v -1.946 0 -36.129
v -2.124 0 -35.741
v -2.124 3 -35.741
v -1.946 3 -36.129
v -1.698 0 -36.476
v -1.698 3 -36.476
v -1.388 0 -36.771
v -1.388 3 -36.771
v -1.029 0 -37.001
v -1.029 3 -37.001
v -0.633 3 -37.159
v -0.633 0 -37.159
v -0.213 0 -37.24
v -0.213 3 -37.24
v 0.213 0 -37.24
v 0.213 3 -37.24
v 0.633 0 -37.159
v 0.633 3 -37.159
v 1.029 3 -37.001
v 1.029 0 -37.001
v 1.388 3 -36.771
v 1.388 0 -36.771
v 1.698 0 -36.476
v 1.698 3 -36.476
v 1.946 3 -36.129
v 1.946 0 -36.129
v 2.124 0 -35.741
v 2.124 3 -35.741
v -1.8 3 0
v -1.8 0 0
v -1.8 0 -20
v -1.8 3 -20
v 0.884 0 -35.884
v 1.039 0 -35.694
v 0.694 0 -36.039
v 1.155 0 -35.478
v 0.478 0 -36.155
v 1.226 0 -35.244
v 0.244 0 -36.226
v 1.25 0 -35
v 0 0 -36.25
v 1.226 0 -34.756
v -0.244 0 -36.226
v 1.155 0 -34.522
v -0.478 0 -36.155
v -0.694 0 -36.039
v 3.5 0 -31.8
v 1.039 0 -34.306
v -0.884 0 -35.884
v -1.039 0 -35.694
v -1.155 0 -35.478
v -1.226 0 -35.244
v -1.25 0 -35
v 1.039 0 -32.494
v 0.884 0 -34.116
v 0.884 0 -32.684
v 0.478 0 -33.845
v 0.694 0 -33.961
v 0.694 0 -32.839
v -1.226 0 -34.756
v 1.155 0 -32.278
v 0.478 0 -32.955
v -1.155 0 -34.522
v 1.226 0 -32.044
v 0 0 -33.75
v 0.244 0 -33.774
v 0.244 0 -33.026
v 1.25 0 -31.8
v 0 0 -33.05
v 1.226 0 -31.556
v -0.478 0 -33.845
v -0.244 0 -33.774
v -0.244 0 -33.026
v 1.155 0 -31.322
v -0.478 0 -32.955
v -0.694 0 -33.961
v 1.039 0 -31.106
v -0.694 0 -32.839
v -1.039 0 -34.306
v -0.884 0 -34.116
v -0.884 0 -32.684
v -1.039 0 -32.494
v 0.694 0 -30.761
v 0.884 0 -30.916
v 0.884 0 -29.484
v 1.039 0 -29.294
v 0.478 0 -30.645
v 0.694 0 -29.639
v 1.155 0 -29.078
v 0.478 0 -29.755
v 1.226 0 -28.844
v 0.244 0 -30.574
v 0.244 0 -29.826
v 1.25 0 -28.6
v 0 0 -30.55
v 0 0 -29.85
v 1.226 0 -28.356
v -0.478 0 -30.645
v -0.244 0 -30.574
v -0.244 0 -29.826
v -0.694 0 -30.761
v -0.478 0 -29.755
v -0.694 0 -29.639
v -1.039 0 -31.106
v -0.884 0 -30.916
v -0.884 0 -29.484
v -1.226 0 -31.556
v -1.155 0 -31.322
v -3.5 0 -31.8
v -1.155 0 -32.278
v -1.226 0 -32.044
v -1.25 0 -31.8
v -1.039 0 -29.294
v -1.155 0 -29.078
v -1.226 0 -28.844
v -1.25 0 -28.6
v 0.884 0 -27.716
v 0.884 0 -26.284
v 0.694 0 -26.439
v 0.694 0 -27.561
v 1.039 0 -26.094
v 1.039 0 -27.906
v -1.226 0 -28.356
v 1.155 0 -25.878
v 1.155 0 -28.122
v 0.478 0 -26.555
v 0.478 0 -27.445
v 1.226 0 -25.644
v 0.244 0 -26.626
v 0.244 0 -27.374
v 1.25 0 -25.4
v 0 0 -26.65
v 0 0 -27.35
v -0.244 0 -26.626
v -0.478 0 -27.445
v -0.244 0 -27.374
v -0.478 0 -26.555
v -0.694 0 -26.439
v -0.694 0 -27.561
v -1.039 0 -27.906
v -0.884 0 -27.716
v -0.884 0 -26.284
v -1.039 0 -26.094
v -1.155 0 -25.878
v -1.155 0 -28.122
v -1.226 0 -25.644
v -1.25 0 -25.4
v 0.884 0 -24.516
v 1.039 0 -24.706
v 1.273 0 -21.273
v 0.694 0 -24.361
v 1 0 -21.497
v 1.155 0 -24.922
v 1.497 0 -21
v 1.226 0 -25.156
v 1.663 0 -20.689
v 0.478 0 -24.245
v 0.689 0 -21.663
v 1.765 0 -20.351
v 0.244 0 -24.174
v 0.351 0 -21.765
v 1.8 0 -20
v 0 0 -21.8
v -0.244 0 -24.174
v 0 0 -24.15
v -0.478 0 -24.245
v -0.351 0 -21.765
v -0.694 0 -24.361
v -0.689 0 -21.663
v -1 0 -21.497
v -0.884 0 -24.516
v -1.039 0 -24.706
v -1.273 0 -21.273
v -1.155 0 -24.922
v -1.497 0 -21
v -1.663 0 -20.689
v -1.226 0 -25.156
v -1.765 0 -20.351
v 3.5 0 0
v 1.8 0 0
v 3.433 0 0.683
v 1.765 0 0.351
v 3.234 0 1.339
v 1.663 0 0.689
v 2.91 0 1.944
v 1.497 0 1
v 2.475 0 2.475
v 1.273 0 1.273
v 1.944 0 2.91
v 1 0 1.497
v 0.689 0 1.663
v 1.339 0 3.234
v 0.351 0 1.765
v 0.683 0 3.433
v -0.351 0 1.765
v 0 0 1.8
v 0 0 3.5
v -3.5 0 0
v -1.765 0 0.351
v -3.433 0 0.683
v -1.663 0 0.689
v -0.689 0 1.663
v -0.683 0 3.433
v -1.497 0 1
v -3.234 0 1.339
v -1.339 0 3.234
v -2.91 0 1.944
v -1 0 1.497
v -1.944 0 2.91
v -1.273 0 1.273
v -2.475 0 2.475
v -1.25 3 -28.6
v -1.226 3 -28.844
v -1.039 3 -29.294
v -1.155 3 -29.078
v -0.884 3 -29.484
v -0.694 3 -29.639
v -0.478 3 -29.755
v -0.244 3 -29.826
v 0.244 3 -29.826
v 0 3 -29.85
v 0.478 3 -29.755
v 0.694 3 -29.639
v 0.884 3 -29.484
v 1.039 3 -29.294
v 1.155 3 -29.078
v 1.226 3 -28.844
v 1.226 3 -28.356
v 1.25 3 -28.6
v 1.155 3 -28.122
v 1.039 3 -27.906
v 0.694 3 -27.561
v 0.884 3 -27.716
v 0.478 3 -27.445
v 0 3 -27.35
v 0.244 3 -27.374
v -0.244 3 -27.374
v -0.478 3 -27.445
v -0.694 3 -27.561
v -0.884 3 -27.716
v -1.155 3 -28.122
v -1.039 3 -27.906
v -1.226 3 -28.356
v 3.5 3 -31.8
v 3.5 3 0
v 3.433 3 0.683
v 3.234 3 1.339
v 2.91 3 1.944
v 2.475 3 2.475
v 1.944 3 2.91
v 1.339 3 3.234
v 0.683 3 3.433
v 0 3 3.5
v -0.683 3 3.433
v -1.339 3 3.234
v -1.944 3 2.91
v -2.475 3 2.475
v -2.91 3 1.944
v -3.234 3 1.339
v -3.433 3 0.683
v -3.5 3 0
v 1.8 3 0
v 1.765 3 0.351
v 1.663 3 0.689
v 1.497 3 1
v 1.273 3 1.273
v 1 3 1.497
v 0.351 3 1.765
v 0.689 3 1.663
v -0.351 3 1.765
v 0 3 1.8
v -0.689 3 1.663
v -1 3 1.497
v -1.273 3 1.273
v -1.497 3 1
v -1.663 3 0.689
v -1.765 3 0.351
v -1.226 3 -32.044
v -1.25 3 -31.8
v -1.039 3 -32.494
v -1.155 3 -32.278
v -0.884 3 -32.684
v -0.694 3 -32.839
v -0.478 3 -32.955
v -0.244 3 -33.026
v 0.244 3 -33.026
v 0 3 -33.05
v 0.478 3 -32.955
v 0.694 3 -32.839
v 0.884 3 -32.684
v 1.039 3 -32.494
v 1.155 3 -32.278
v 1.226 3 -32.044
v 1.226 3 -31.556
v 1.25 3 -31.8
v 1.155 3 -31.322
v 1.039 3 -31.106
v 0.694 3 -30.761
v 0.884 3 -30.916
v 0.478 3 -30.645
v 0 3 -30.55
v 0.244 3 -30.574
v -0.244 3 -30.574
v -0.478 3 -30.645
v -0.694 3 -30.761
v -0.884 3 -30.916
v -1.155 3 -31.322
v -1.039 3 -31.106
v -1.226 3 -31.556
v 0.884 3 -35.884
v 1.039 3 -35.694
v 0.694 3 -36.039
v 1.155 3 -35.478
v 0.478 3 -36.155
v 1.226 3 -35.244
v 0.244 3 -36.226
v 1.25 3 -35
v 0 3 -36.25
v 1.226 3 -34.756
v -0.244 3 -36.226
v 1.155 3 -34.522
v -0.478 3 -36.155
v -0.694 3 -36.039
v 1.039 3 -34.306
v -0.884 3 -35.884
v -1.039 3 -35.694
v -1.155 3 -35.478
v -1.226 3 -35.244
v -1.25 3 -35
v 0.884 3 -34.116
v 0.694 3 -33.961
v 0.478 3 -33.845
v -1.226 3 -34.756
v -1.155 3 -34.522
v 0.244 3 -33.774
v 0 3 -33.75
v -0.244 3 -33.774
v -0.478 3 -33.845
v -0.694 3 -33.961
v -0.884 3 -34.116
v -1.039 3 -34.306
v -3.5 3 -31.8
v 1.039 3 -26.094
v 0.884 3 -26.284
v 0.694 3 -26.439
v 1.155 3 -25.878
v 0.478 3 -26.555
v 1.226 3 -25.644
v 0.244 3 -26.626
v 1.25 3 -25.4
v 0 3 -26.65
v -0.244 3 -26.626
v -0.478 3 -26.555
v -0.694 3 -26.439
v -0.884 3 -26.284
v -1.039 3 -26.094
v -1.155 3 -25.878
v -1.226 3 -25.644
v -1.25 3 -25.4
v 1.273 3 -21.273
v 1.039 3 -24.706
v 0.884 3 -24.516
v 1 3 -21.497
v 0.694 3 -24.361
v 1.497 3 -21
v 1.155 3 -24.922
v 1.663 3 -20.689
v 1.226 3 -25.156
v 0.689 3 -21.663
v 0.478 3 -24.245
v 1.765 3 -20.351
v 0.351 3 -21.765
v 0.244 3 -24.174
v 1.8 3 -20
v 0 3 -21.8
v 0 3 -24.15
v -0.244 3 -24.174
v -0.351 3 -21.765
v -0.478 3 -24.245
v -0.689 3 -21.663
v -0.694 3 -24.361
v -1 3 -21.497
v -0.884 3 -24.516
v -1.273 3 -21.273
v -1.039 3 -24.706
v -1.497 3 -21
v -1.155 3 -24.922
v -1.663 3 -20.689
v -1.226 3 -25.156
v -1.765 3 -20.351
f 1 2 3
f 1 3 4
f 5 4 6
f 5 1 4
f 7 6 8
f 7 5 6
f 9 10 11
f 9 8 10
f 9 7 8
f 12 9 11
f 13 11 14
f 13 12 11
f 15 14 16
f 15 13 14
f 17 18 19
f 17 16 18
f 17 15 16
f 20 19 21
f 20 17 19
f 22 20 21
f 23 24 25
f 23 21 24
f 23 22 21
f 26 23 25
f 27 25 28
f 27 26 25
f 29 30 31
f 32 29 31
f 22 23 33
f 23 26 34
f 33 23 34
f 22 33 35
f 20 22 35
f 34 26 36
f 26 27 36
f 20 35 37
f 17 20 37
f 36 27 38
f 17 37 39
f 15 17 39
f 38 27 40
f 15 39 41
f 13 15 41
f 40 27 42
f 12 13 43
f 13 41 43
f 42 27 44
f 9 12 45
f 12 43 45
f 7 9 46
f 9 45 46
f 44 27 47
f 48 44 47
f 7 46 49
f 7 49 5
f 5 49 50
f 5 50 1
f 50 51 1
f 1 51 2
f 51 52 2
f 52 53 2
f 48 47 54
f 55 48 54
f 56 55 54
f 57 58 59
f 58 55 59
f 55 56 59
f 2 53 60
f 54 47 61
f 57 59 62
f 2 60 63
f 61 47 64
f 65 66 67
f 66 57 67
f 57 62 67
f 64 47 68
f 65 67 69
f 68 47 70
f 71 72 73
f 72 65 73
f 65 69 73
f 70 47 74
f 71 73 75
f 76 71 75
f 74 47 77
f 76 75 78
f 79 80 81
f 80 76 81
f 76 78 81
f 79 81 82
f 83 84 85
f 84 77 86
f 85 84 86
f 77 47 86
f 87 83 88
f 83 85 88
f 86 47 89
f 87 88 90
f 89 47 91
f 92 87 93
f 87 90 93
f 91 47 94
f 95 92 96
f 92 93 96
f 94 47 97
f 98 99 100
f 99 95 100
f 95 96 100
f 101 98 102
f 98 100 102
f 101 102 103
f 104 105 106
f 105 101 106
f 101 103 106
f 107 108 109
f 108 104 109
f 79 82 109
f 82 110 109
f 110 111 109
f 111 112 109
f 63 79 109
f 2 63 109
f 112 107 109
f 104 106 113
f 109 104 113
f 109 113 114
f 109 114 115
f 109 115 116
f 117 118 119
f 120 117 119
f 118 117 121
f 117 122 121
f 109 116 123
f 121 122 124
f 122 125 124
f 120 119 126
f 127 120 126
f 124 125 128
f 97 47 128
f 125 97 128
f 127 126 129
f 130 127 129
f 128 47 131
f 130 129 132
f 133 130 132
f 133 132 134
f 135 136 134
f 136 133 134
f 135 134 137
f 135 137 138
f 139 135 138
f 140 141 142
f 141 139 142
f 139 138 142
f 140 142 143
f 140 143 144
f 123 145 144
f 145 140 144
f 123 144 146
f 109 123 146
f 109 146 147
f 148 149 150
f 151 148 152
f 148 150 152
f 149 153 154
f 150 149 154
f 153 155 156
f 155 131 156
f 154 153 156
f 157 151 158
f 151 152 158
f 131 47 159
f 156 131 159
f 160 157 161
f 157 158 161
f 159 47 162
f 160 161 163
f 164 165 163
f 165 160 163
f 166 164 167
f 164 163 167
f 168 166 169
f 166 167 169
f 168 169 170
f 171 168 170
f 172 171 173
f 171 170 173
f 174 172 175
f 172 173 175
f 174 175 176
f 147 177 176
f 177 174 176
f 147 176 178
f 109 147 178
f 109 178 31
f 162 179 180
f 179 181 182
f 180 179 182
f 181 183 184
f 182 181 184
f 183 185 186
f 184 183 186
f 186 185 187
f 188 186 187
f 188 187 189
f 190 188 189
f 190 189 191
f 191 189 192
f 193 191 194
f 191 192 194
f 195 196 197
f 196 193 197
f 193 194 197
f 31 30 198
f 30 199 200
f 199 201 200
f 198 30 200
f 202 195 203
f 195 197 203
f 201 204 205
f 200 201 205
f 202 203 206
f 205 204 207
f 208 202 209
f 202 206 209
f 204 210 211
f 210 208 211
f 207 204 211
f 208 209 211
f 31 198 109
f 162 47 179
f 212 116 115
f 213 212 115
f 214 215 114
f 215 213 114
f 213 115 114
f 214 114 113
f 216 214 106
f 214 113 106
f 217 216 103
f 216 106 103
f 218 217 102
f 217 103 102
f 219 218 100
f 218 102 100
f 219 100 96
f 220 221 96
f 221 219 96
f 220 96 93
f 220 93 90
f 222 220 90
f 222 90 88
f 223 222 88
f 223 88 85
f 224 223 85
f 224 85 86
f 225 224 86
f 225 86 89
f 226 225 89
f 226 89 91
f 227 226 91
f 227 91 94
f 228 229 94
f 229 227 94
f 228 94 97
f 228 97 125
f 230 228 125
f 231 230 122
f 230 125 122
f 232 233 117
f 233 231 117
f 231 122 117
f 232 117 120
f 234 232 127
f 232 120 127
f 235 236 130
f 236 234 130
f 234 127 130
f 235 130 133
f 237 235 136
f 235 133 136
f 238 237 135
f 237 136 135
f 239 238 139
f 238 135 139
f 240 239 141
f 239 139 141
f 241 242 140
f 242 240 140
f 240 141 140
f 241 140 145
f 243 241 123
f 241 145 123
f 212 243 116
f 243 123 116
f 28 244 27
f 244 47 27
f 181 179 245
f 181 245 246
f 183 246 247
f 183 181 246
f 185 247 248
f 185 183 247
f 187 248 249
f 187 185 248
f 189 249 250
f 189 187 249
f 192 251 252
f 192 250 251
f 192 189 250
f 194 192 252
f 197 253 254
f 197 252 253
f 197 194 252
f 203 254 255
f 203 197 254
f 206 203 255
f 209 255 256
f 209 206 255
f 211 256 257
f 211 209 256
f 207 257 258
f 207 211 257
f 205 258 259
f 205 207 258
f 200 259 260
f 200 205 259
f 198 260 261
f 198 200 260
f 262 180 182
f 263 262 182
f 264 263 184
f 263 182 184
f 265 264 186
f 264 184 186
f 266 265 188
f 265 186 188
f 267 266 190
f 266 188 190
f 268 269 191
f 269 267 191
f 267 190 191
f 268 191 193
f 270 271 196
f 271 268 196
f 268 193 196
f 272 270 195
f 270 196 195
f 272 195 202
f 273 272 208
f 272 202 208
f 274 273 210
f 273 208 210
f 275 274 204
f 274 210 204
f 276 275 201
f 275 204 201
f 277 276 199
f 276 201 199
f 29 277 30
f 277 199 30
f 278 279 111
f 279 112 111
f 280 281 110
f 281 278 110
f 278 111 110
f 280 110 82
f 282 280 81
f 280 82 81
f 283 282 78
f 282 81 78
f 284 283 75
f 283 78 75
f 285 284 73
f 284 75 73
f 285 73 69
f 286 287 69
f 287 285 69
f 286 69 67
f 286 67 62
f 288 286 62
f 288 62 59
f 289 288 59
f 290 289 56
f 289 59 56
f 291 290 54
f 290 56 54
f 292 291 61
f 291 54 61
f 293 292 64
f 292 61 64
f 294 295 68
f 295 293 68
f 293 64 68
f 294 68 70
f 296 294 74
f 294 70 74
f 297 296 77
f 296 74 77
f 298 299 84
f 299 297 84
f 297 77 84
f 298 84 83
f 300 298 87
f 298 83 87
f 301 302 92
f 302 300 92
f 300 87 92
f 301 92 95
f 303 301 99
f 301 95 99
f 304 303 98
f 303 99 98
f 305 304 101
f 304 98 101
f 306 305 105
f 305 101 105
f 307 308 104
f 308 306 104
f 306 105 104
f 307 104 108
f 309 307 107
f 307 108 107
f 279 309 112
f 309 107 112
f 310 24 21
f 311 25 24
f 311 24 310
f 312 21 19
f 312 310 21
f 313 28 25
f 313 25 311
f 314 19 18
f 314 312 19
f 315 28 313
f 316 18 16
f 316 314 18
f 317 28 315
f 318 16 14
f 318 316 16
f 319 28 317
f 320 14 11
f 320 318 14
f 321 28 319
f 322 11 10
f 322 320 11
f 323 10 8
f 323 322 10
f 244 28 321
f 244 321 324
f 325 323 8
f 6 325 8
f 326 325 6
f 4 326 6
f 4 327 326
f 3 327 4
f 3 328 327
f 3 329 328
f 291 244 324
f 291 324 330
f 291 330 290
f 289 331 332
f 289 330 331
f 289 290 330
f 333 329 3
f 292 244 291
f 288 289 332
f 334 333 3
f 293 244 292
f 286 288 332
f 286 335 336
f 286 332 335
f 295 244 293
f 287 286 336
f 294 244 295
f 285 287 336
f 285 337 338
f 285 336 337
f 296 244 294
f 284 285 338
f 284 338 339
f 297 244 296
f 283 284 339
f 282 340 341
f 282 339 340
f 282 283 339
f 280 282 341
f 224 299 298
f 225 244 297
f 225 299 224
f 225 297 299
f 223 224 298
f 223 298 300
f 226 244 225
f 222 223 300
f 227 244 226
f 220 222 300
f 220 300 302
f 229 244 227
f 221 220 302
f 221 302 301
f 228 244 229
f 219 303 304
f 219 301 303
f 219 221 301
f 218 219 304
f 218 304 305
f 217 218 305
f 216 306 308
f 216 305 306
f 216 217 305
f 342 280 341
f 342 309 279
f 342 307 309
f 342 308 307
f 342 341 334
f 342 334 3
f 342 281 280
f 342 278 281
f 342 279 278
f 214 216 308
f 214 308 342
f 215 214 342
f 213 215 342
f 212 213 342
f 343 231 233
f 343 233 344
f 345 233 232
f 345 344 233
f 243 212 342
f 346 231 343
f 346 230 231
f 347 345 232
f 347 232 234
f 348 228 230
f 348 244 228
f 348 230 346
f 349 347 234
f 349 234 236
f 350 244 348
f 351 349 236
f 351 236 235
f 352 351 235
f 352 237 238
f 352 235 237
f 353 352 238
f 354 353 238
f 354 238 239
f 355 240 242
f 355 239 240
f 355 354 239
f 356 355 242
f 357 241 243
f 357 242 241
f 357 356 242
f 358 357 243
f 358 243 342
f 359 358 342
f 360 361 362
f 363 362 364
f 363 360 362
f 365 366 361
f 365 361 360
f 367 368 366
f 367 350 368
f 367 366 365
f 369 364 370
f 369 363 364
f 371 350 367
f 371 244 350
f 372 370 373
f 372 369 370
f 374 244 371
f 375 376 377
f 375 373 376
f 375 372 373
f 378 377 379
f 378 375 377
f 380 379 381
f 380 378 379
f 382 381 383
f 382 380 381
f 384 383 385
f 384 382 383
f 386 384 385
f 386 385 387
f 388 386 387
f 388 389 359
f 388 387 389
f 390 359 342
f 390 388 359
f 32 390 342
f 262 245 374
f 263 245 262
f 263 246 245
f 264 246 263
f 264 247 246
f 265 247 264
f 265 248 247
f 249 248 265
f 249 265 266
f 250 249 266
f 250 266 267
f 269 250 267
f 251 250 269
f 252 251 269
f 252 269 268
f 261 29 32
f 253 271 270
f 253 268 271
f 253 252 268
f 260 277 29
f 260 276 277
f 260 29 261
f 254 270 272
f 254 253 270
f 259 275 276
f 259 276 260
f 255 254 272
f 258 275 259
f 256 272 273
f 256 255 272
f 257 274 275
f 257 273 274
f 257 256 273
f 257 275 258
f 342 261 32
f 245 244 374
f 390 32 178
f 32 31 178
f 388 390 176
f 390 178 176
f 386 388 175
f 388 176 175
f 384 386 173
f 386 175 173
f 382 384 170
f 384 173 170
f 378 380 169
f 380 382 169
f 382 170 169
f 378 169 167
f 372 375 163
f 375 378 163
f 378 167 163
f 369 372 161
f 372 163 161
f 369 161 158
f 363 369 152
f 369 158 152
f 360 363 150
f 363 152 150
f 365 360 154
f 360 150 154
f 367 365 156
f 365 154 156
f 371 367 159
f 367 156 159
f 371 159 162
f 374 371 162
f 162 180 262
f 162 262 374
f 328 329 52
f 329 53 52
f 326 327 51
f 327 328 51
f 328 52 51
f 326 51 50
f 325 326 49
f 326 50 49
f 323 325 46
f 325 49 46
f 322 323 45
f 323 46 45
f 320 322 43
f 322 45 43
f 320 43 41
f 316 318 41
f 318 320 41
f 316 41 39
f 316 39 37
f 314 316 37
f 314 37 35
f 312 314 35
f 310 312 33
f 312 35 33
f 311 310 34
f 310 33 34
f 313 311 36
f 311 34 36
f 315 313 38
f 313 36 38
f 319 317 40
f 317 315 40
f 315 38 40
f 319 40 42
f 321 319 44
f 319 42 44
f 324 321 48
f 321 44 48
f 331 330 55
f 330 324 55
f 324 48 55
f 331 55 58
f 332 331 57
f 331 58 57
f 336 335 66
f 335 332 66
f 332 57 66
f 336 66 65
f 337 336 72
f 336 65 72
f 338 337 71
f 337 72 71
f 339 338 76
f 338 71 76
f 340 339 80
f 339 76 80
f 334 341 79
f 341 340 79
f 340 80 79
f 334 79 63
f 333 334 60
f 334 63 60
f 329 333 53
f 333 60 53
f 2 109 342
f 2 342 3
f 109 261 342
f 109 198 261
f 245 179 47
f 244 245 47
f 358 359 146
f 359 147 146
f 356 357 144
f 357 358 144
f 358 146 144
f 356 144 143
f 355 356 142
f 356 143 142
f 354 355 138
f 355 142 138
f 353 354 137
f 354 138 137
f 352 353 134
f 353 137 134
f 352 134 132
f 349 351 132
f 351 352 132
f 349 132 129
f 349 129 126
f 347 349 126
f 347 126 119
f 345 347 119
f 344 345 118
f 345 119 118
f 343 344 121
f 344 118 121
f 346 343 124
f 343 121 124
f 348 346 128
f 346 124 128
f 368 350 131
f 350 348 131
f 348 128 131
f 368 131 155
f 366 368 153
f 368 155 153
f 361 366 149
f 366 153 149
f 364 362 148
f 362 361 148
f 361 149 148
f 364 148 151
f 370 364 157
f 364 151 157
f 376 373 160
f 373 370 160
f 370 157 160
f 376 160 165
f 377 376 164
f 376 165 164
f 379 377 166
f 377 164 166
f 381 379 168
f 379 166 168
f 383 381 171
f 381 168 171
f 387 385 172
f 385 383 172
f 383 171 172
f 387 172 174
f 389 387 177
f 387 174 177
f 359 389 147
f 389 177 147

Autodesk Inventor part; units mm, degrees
ref_plane "YZ Plane" through (0, 0, 0) normal (1, 0, 0) x (0, 1, 0)
ref_plane "XZ Plane" through (0, 0, 0) normal (0, 1, 0) x (-1, 0, 0)
ref_plane "XY Plane" through (0, 0, 0) normal (0, 0, 1) x (1, 0, 0)
sketch "草圖1" plane through (0, 0, 0) normal (0, 1, 0) x (-1, 0, 0)
  arc A0 (1.8, 0) -> (-1.8, 0) centre (0, 0) ccw
  line L0 (0, 0) -> (0, -20) construction
  arc A1 (-1.8, -20) -> (1.8, -20) centre (0, -20) ccw
  arc A2 (3.5, 0) -> (-3.5, 0) centre (0, 0) ccw
  line L1 (1.8, 0) -> (1.8, -20)
  line L2 (-1.8, 0) -> (-1.8, -20)
  line L3 (0, -20) -> (0, -35) construction
  line L4 (3.5, 0) -> (3.5, -31.8)
  line L5 (-3.5, 0) -> (-3.5, -31.8)
  circle A3 centre (0, -35) radius 1.25
  line L6 (0, -35) -> (0, -25.4) construction
  line L7 (0, -35) -> (0, -31.8) construction
  line L8 (0, -31.8) -> (0, -28.6) construction
  line L9 (0, -28.6) -> (0, -25.4) construction
  circle A4 centre (0, -31.8) radius 1.25
  circle A5 centre (0, -28.6) radius 1.25
  circle A6 centre (0, -25.4) radius 1.25
  line L10 (3.5, -31.8) -> (2.1243, -35.7414)
  line L11 (-3.5, -31.8) -> (-2.1243, -35.7414)
  arc A7 (-2.1243, -35.7414) -> (2.1243, -35.7414) centre (0, -35) ccw
  dimension "d0" = 3.6
  dimension "d1" = 20
  dimension "d2" = 3.6
  dimension "d3" = 7
  dimension "d5" = 15
  dimension "d9" = 2.5
  dimension "d13" = 3.2
  dimension "d14" = 3.2
  dimension "d15" = 3.2
  dimension "d16" = 2.5
  dimension "d17" = 2.5
  dimension "d18" = 2.5
extrude "Extrusion3" add sketch "草圖1" along normal blind 3
properties part number "轉向軸"
